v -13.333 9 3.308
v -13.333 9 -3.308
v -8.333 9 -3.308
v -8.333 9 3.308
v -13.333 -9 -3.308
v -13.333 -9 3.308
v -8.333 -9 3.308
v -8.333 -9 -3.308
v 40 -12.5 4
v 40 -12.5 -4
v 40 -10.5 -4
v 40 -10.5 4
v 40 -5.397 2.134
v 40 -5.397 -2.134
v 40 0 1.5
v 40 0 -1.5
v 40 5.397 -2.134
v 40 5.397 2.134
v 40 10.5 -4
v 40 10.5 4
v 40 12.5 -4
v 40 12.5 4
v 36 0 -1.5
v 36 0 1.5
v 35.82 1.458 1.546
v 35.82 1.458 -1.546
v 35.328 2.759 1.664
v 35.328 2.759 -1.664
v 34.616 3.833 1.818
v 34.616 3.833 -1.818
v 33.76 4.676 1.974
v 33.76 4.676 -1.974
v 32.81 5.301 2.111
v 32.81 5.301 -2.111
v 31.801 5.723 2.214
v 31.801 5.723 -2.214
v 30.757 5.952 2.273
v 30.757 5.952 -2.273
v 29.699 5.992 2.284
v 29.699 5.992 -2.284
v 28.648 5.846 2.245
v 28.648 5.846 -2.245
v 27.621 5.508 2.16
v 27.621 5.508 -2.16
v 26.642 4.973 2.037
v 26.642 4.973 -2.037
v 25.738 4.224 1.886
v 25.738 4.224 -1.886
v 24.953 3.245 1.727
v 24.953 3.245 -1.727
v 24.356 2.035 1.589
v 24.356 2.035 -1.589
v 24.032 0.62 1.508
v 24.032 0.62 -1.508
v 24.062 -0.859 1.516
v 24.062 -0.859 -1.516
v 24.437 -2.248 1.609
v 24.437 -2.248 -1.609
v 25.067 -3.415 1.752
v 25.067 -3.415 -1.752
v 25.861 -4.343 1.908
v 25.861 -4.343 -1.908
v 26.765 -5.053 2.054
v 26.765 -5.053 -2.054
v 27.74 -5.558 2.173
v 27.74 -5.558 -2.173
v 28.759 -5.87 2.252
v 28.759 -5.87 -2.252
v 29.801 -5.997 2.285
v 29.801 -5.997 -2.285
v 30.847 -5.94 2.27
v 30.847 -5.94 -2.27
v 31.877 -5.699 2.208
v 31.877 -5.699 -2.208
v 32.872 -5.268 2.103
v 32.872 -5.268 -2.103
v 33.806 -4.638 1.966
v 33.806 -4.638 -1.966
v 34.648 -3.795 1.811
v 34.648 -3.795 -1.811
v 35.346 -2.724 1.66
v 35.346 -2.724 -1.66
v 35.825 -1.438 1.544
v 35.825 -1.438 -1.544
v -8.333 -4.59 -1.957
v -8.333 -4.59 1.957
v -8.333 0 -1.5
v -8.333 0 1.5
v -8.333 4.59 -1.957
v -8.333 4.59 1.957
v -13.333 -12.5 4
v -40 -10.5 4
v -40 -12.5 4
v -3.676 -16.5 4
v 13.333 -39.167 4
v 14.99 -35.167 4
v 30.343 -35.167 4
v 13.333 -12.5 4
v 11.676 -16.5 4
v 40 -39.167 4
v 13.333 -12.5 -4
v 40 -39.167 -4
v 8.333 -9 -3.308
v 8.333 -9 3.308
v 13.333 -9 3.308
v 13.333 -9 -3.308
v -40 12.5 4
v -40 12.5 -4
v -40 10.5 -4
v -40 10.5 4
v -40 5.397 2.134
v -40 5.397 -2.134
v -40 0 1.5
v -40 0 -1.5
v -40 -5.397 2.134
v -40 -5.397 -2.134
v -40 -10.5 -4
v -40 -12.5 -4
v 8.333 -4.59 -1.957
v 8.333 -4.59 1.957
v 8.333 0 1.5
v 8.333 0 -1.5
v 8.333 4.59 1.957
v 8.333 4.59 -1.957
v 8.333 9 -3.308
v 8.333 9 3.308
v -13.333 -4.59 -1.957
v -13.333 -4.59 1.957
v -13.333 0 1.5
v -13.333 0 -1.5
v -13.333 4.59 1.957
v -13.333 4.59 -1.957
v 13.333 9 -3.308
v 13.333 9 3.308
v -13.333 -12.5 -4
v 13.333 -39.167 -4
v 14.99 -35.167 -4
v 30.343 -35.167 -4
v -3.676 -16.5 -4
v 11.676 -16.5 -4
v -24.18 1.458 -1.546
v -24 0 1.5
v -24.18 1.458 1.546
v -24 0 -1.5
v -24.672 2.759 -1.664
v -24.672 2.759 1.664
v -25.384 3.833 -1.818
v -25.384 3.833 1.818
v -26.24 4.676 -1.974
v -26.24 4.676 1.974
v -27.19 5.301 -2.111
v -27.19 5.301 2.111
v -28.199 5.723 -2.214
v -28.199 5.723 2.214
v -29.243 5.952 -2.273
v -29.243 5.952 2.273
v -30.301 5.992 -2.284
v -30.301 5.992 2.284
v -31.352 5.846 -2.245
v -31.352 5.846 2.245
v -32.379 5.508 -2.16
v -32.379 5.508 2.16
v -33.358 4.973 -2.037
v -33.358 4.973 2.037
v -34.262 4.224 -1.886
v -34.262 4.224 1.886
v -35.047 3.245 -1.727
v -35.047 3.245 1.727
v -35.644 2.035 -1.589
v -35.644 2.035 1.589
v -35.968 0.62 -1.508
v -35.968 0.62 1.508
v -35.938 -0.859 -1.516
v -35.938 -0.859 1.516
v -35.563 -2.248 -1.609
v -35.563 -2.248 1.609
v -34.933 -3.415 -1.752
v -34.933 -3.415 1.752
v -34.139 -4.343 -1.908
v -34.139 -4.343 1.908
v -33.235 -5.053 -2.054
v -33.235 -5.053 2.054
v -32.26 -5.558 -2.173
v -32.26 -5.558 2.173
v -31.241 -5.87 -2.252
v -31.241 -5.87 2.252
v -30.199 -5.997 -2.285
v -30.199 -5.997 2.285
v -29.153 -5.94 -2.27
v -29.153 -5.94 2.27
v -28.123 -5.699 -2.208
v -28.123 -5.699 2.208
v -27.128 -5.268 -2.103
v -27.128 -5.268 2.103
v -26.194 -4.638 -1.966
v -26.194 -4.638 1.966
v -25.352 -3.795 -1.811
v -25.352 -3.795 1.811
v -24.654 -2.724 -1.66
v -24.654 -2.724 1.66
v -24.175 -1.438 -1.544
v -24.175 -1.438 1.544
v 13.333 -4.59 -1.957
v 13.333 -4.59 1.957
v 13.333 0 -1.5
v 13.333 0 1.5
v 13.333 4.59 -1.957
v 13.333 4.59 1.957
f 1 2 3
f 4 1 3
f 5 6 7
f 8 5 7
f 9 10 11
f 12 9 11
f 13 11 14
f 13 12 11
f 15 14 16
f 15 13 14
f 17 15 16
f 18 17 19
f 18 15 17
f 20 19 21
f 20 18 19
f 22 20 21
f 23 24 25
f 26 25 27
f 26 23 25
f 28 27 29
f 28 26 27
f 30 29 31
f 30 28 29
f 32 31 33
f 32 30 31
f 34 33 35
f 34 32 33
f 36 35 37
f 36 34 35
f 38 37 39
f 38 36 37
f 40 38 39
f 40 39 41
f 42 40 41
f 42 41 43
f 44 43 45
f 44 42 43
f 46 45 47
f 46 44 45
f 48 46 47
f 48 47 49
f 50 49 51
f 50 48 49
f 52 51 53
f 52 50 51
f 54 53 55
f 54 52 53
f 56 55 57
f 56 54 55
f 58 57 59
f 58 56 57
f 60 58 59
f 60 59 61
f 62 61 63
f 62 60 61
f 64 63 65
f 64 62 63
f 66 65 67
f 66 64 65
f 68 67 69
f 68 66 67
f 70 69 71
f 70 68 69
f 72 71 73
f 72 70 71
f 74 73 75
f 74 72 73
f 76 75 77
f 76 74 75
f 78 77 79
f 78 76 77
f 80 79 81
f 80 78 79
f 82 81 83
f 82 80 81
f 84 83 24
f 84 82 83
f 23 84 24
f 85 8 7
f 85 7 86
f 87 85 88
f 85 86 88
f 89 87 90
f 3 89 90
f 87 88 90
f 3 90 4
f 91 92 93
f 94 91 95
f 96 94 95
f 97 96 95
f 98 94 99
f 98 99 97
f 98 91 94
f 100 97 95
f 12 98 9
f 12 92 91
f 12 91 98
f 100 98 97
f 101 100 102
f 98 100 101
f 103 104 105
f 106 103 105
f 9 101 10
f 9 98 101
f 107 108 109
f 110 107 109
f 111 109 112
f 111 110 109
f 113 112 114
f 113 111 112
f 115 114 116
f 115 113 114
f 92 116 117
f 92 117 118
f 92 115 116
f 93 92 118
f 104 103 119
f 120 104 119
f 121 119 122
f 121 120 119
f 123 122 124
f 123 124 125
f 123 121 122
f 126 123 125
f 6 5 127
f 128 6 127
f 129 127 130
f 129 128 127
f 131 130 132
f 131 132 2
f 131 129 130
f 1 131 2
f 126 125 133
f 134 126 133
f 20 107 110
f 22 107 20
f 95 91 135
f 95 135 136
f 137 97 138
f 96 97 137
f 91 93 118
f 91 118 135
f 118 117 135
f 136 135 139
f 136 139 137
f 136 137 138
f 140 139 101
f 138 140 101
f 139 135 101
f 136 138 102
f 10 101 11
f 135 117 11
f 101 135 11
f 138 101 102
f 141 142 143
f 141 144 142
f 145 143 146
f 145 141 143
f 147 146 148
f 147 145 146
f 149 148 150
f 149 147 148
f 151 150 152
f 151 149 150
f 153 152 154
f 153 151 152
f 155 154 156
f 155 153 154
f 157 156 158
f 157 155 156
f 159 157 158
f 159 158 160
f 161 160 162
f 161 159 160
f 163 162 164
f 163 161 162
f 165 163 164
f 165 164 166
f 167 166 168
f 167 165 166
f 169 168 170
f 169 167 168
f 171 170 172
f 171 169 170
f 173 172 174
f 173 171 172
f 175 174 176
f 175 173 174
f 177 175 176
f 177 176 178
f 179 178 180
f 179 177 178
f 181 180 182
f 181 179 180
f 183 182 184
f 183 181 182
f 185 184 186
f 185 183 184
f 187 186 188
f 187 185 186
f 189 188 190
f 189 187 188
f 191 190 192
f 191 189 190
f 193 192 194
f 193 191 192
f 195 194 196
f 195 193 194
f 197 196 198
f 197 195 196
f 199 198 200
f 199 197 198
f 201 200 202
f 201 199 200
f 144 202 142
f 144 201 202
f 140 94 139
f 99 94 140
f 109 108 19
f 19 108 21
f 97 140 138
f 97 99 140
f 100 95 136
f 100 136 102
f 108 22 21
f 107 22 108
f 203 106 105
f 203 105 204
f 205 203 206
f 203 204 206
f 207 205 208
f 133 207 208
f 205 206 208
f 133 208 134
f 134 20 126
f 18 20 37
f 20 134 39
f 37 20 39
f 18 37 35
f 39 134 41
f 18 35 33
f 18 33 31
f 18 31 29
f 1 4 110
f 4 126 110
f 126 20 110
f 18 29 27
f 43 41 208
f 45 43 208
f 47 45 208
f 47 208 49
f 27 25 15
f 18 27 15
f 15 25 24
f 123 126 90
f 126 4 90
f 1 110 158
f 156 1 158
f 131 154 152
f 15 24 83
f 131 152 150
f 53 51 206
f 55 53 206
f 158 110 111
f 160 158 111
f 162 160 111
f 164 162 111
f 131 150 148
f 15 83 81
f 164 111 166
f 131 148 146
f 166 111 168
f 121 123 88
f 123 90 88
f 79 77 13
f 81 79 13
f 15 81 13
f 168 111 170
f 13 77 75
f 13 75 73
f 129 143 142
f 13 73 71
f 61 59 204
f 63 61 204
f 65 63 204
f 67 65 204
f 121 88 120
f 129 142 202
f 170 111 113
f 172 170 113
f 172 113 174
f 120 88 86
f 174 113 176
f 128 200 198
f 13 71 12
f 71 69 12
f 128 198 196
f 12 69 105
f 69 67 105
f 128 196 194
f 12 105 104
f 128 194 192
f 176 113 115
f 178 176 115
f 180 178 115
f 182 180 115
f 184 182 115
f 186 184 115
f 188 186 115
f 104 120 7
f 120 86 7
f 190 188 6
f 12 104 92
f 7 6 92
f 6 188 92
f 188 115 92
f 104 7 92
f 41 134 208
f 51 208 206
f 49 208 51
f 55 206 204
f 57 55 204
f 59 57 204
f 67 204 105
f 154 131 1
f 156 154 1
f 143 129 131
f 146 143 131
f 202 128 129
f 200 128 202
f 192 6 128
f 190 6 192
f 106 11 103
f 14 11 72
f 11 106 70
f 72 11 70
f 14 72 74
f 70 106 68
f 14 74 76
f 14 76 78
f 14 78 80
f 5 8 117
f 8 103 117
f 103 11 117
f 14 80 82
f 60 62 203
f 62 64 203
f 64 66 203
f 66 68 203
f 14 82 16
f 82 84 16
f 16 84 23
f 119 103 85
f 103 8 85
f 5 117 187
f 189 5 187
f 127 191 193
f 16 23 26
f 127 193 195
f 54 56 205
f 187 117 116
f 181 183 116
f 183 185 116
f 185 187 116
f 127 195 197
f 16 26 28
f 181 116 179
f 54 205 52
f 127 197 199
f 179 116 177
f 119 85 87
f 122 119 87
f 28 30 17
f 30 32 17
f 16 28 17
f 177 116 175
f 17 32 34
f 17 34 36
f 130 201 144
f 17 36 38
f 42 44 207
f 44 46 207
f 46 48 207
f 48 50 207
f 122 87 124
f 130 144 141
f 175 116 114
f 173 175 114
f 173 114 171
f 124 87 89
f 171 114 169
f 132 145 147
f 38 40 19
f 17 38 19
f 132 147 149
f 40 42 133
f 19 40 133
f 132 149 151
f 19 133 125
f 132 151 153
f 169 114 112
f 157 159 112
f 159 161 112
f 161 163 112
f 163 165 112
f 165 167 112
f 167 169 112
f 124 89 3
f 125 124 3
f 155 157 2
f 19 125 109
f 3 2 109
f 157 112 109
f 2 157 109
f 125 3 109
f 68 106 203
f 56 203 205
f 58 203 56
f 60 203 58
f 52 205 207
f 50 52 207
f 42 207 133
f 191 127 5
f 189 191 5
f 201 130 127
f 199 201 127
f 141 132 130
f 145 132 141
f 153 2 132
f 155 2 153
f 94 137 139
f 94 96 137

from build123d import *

# Parameters (mm, degrees)
SKETCH_R     = 6
SKETCH_W     = 5
SKETCH_H     = 18
PAD_DEPTH    = 4
POCKET_DEPTH = 80.001


with BuildPart() as part:
    # Sketch → Pad (new body, symmetric)
    with BuildSketch(Plane.XY):
        Polygon((-40, 12.5), (-40, -12.5), (-13.333333, -12.5), (13.333333, -39.166667), (40, -39.166667), (13.333333, -12.5), (40, -12.5), (40, 12.5), align=None)
        with Locations((-30, 0)):
            Circle(SKETCH_R, mode=Mode.SUBTRACT)
        with Locations((30, 0)):
            Circle(SKETCH_R, mode=Mode.SUBTRACT)
        with Locations((-10.833333, 0)):
            Rectangle(SKETCH_W, SKETCH_H, mode=Mode.SUBTRACT)
        with Locations((10.833333, 0)):
            Rectangle(SKETCH_W, SKETCH_H, mode=Mode.SUBTRACT)
        Polygon((-3.676479, -16.5), (11.676479, -16.5), (30.343146, -35.166667), (14.990188, -35.166667), align=None, mode=Mode.SUBTRACT)
    extrude(amount=PAD_DEPTH, both=True)

    # Sketch002 → Pocket (cut, through all)
    with BuildSketch(Plane(origin=(-40, 0, 0), x_dir=(0, -1, 0), z_dir=(-1, 0, 0))):
        with BuildLine():
            ThreePointArc((-10.5, 4), (0, 1.5), (10.5, 4))
            Line((-10.5, 4), (10.5, 4))
        make_face()
        with BuildLine():
            Line((-10.5, -4), (10.5, -4))
            ThreePointArc((10.5, -4), (0, -1.5), (-10.5, -4))
        make_face()
    extrude(amount=-POCKET_DEPTH, mode=Mode.SUBTRACT)


solid = part.part
